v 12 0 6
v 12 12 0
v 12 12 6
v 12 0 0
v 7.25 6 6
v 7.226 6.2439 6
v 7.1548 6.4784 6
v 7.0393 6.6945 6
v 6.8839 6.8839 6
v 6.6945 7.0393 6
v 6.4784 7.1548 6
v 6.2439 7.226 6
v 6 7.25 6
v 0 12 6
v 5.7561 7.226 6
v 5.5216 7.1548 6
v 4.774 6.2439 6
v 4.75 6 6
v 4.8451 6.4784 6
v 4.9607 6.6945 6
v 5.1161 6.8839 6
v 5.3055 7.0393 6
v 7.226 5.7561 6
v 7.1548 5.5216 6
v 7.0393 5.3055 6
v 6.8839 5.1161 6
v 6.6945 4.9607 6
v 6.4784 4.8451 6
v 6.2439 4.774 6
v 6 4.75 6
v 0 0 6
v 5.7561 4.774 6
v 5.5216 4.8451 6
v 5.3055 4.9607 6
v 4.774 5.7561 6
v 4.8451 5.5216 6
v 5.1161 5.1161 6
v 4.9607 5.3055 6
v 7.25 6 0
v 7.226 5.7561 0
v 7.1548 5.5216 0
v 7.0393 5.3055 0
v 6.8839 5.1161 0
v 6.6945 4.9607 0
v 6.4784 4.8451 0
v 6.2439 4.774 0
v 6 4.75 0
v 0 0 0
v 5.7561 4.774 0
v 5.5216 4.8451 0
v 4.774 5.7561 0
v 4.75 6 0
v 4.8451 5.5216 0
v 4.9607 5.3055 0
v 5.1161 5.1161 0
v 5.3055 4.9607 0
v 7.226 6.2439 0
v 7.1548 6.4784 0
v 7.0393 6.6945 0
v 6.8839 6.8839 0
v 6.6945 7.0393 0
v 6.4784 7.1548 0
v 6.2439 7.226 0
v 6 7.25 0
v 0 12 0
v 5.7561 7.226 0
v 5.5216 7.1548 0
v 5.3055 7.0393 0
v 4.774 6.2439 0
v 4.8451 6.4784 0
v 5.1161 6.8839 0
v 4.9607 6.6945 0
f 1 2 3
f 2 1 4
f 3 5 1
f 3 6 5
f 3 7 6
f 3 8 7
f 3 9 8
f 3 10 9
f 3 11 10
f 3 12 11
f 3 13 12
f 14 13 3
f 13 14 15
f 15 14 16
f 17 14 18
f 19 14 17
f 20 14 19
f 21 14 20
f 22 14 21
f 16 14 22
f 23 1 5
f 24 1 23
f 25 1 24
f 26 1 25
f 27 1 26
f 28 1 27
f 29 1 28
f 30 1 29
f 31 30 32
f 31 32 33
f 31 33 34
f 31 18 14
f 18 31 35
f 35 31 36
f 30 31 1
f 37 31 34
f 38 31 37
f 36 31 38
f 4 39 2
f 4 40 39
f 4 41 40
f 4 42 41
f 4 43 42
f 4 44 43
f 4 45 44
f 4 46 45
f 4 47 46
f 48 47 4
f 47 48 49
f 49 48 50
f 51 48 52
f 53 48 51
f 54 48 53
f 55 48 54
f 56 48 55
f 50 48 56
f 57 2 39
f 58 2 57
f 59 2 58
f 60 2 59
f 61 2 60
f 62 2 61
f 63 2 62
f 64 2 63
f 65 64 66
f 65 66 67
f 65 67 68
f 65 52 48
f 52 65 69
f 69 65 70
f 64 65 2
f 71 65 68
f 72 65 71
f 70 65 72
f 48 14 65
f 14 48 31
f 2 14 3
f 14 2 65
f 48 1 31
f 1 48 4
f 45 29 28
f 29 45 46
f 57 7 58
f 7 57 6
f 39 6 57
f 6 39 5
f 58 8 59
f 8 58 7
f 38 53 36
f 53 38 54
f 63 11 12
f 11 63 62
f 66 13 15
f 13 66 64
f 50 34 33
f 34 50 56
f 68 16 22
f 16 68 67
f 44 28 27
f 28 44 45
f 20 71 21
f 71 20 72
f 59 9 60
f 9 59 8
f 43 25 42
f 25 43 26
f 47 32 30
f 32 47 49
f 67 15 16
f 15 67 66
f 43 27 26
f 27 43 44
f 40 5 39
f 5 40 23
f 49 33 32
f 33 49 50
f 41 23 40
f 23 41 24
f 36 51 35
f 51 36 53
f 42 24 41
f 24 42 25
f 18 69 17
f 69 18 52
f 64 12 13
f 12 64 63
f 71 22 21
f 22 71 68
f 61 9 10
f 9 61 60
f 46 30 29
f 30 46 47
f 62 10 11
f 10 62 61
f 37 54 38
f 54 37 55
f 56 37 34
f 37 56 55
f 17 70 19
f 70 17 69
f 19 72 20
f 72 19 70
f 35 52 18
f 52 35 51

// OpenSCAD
$fn = 32;

// ----------------------------------------------------------------------
// Micro pad: drilled pad, 5-20 mm class
// ----------------------------------------------------------------------

// --- parameters (mm) ---
pad_l = 12;               // pad length, X
pad_w = 12;               // pad width, Y
pad_t = 6;                // pad thickness, Z
hole_d = 2.5;             // through hole diameter
fit_tol = 0.02;           // tolerance for press fits, mm
free_tol = 0.2;           // tolerance for clearance fits, mm

difference() {
  cube([pad_l, pad_w, pad_t]);
  translate([pad_l / 2, pad_w / 2, -1])
    cylinder(h = pad_t + 2, d = hole_d);
}
